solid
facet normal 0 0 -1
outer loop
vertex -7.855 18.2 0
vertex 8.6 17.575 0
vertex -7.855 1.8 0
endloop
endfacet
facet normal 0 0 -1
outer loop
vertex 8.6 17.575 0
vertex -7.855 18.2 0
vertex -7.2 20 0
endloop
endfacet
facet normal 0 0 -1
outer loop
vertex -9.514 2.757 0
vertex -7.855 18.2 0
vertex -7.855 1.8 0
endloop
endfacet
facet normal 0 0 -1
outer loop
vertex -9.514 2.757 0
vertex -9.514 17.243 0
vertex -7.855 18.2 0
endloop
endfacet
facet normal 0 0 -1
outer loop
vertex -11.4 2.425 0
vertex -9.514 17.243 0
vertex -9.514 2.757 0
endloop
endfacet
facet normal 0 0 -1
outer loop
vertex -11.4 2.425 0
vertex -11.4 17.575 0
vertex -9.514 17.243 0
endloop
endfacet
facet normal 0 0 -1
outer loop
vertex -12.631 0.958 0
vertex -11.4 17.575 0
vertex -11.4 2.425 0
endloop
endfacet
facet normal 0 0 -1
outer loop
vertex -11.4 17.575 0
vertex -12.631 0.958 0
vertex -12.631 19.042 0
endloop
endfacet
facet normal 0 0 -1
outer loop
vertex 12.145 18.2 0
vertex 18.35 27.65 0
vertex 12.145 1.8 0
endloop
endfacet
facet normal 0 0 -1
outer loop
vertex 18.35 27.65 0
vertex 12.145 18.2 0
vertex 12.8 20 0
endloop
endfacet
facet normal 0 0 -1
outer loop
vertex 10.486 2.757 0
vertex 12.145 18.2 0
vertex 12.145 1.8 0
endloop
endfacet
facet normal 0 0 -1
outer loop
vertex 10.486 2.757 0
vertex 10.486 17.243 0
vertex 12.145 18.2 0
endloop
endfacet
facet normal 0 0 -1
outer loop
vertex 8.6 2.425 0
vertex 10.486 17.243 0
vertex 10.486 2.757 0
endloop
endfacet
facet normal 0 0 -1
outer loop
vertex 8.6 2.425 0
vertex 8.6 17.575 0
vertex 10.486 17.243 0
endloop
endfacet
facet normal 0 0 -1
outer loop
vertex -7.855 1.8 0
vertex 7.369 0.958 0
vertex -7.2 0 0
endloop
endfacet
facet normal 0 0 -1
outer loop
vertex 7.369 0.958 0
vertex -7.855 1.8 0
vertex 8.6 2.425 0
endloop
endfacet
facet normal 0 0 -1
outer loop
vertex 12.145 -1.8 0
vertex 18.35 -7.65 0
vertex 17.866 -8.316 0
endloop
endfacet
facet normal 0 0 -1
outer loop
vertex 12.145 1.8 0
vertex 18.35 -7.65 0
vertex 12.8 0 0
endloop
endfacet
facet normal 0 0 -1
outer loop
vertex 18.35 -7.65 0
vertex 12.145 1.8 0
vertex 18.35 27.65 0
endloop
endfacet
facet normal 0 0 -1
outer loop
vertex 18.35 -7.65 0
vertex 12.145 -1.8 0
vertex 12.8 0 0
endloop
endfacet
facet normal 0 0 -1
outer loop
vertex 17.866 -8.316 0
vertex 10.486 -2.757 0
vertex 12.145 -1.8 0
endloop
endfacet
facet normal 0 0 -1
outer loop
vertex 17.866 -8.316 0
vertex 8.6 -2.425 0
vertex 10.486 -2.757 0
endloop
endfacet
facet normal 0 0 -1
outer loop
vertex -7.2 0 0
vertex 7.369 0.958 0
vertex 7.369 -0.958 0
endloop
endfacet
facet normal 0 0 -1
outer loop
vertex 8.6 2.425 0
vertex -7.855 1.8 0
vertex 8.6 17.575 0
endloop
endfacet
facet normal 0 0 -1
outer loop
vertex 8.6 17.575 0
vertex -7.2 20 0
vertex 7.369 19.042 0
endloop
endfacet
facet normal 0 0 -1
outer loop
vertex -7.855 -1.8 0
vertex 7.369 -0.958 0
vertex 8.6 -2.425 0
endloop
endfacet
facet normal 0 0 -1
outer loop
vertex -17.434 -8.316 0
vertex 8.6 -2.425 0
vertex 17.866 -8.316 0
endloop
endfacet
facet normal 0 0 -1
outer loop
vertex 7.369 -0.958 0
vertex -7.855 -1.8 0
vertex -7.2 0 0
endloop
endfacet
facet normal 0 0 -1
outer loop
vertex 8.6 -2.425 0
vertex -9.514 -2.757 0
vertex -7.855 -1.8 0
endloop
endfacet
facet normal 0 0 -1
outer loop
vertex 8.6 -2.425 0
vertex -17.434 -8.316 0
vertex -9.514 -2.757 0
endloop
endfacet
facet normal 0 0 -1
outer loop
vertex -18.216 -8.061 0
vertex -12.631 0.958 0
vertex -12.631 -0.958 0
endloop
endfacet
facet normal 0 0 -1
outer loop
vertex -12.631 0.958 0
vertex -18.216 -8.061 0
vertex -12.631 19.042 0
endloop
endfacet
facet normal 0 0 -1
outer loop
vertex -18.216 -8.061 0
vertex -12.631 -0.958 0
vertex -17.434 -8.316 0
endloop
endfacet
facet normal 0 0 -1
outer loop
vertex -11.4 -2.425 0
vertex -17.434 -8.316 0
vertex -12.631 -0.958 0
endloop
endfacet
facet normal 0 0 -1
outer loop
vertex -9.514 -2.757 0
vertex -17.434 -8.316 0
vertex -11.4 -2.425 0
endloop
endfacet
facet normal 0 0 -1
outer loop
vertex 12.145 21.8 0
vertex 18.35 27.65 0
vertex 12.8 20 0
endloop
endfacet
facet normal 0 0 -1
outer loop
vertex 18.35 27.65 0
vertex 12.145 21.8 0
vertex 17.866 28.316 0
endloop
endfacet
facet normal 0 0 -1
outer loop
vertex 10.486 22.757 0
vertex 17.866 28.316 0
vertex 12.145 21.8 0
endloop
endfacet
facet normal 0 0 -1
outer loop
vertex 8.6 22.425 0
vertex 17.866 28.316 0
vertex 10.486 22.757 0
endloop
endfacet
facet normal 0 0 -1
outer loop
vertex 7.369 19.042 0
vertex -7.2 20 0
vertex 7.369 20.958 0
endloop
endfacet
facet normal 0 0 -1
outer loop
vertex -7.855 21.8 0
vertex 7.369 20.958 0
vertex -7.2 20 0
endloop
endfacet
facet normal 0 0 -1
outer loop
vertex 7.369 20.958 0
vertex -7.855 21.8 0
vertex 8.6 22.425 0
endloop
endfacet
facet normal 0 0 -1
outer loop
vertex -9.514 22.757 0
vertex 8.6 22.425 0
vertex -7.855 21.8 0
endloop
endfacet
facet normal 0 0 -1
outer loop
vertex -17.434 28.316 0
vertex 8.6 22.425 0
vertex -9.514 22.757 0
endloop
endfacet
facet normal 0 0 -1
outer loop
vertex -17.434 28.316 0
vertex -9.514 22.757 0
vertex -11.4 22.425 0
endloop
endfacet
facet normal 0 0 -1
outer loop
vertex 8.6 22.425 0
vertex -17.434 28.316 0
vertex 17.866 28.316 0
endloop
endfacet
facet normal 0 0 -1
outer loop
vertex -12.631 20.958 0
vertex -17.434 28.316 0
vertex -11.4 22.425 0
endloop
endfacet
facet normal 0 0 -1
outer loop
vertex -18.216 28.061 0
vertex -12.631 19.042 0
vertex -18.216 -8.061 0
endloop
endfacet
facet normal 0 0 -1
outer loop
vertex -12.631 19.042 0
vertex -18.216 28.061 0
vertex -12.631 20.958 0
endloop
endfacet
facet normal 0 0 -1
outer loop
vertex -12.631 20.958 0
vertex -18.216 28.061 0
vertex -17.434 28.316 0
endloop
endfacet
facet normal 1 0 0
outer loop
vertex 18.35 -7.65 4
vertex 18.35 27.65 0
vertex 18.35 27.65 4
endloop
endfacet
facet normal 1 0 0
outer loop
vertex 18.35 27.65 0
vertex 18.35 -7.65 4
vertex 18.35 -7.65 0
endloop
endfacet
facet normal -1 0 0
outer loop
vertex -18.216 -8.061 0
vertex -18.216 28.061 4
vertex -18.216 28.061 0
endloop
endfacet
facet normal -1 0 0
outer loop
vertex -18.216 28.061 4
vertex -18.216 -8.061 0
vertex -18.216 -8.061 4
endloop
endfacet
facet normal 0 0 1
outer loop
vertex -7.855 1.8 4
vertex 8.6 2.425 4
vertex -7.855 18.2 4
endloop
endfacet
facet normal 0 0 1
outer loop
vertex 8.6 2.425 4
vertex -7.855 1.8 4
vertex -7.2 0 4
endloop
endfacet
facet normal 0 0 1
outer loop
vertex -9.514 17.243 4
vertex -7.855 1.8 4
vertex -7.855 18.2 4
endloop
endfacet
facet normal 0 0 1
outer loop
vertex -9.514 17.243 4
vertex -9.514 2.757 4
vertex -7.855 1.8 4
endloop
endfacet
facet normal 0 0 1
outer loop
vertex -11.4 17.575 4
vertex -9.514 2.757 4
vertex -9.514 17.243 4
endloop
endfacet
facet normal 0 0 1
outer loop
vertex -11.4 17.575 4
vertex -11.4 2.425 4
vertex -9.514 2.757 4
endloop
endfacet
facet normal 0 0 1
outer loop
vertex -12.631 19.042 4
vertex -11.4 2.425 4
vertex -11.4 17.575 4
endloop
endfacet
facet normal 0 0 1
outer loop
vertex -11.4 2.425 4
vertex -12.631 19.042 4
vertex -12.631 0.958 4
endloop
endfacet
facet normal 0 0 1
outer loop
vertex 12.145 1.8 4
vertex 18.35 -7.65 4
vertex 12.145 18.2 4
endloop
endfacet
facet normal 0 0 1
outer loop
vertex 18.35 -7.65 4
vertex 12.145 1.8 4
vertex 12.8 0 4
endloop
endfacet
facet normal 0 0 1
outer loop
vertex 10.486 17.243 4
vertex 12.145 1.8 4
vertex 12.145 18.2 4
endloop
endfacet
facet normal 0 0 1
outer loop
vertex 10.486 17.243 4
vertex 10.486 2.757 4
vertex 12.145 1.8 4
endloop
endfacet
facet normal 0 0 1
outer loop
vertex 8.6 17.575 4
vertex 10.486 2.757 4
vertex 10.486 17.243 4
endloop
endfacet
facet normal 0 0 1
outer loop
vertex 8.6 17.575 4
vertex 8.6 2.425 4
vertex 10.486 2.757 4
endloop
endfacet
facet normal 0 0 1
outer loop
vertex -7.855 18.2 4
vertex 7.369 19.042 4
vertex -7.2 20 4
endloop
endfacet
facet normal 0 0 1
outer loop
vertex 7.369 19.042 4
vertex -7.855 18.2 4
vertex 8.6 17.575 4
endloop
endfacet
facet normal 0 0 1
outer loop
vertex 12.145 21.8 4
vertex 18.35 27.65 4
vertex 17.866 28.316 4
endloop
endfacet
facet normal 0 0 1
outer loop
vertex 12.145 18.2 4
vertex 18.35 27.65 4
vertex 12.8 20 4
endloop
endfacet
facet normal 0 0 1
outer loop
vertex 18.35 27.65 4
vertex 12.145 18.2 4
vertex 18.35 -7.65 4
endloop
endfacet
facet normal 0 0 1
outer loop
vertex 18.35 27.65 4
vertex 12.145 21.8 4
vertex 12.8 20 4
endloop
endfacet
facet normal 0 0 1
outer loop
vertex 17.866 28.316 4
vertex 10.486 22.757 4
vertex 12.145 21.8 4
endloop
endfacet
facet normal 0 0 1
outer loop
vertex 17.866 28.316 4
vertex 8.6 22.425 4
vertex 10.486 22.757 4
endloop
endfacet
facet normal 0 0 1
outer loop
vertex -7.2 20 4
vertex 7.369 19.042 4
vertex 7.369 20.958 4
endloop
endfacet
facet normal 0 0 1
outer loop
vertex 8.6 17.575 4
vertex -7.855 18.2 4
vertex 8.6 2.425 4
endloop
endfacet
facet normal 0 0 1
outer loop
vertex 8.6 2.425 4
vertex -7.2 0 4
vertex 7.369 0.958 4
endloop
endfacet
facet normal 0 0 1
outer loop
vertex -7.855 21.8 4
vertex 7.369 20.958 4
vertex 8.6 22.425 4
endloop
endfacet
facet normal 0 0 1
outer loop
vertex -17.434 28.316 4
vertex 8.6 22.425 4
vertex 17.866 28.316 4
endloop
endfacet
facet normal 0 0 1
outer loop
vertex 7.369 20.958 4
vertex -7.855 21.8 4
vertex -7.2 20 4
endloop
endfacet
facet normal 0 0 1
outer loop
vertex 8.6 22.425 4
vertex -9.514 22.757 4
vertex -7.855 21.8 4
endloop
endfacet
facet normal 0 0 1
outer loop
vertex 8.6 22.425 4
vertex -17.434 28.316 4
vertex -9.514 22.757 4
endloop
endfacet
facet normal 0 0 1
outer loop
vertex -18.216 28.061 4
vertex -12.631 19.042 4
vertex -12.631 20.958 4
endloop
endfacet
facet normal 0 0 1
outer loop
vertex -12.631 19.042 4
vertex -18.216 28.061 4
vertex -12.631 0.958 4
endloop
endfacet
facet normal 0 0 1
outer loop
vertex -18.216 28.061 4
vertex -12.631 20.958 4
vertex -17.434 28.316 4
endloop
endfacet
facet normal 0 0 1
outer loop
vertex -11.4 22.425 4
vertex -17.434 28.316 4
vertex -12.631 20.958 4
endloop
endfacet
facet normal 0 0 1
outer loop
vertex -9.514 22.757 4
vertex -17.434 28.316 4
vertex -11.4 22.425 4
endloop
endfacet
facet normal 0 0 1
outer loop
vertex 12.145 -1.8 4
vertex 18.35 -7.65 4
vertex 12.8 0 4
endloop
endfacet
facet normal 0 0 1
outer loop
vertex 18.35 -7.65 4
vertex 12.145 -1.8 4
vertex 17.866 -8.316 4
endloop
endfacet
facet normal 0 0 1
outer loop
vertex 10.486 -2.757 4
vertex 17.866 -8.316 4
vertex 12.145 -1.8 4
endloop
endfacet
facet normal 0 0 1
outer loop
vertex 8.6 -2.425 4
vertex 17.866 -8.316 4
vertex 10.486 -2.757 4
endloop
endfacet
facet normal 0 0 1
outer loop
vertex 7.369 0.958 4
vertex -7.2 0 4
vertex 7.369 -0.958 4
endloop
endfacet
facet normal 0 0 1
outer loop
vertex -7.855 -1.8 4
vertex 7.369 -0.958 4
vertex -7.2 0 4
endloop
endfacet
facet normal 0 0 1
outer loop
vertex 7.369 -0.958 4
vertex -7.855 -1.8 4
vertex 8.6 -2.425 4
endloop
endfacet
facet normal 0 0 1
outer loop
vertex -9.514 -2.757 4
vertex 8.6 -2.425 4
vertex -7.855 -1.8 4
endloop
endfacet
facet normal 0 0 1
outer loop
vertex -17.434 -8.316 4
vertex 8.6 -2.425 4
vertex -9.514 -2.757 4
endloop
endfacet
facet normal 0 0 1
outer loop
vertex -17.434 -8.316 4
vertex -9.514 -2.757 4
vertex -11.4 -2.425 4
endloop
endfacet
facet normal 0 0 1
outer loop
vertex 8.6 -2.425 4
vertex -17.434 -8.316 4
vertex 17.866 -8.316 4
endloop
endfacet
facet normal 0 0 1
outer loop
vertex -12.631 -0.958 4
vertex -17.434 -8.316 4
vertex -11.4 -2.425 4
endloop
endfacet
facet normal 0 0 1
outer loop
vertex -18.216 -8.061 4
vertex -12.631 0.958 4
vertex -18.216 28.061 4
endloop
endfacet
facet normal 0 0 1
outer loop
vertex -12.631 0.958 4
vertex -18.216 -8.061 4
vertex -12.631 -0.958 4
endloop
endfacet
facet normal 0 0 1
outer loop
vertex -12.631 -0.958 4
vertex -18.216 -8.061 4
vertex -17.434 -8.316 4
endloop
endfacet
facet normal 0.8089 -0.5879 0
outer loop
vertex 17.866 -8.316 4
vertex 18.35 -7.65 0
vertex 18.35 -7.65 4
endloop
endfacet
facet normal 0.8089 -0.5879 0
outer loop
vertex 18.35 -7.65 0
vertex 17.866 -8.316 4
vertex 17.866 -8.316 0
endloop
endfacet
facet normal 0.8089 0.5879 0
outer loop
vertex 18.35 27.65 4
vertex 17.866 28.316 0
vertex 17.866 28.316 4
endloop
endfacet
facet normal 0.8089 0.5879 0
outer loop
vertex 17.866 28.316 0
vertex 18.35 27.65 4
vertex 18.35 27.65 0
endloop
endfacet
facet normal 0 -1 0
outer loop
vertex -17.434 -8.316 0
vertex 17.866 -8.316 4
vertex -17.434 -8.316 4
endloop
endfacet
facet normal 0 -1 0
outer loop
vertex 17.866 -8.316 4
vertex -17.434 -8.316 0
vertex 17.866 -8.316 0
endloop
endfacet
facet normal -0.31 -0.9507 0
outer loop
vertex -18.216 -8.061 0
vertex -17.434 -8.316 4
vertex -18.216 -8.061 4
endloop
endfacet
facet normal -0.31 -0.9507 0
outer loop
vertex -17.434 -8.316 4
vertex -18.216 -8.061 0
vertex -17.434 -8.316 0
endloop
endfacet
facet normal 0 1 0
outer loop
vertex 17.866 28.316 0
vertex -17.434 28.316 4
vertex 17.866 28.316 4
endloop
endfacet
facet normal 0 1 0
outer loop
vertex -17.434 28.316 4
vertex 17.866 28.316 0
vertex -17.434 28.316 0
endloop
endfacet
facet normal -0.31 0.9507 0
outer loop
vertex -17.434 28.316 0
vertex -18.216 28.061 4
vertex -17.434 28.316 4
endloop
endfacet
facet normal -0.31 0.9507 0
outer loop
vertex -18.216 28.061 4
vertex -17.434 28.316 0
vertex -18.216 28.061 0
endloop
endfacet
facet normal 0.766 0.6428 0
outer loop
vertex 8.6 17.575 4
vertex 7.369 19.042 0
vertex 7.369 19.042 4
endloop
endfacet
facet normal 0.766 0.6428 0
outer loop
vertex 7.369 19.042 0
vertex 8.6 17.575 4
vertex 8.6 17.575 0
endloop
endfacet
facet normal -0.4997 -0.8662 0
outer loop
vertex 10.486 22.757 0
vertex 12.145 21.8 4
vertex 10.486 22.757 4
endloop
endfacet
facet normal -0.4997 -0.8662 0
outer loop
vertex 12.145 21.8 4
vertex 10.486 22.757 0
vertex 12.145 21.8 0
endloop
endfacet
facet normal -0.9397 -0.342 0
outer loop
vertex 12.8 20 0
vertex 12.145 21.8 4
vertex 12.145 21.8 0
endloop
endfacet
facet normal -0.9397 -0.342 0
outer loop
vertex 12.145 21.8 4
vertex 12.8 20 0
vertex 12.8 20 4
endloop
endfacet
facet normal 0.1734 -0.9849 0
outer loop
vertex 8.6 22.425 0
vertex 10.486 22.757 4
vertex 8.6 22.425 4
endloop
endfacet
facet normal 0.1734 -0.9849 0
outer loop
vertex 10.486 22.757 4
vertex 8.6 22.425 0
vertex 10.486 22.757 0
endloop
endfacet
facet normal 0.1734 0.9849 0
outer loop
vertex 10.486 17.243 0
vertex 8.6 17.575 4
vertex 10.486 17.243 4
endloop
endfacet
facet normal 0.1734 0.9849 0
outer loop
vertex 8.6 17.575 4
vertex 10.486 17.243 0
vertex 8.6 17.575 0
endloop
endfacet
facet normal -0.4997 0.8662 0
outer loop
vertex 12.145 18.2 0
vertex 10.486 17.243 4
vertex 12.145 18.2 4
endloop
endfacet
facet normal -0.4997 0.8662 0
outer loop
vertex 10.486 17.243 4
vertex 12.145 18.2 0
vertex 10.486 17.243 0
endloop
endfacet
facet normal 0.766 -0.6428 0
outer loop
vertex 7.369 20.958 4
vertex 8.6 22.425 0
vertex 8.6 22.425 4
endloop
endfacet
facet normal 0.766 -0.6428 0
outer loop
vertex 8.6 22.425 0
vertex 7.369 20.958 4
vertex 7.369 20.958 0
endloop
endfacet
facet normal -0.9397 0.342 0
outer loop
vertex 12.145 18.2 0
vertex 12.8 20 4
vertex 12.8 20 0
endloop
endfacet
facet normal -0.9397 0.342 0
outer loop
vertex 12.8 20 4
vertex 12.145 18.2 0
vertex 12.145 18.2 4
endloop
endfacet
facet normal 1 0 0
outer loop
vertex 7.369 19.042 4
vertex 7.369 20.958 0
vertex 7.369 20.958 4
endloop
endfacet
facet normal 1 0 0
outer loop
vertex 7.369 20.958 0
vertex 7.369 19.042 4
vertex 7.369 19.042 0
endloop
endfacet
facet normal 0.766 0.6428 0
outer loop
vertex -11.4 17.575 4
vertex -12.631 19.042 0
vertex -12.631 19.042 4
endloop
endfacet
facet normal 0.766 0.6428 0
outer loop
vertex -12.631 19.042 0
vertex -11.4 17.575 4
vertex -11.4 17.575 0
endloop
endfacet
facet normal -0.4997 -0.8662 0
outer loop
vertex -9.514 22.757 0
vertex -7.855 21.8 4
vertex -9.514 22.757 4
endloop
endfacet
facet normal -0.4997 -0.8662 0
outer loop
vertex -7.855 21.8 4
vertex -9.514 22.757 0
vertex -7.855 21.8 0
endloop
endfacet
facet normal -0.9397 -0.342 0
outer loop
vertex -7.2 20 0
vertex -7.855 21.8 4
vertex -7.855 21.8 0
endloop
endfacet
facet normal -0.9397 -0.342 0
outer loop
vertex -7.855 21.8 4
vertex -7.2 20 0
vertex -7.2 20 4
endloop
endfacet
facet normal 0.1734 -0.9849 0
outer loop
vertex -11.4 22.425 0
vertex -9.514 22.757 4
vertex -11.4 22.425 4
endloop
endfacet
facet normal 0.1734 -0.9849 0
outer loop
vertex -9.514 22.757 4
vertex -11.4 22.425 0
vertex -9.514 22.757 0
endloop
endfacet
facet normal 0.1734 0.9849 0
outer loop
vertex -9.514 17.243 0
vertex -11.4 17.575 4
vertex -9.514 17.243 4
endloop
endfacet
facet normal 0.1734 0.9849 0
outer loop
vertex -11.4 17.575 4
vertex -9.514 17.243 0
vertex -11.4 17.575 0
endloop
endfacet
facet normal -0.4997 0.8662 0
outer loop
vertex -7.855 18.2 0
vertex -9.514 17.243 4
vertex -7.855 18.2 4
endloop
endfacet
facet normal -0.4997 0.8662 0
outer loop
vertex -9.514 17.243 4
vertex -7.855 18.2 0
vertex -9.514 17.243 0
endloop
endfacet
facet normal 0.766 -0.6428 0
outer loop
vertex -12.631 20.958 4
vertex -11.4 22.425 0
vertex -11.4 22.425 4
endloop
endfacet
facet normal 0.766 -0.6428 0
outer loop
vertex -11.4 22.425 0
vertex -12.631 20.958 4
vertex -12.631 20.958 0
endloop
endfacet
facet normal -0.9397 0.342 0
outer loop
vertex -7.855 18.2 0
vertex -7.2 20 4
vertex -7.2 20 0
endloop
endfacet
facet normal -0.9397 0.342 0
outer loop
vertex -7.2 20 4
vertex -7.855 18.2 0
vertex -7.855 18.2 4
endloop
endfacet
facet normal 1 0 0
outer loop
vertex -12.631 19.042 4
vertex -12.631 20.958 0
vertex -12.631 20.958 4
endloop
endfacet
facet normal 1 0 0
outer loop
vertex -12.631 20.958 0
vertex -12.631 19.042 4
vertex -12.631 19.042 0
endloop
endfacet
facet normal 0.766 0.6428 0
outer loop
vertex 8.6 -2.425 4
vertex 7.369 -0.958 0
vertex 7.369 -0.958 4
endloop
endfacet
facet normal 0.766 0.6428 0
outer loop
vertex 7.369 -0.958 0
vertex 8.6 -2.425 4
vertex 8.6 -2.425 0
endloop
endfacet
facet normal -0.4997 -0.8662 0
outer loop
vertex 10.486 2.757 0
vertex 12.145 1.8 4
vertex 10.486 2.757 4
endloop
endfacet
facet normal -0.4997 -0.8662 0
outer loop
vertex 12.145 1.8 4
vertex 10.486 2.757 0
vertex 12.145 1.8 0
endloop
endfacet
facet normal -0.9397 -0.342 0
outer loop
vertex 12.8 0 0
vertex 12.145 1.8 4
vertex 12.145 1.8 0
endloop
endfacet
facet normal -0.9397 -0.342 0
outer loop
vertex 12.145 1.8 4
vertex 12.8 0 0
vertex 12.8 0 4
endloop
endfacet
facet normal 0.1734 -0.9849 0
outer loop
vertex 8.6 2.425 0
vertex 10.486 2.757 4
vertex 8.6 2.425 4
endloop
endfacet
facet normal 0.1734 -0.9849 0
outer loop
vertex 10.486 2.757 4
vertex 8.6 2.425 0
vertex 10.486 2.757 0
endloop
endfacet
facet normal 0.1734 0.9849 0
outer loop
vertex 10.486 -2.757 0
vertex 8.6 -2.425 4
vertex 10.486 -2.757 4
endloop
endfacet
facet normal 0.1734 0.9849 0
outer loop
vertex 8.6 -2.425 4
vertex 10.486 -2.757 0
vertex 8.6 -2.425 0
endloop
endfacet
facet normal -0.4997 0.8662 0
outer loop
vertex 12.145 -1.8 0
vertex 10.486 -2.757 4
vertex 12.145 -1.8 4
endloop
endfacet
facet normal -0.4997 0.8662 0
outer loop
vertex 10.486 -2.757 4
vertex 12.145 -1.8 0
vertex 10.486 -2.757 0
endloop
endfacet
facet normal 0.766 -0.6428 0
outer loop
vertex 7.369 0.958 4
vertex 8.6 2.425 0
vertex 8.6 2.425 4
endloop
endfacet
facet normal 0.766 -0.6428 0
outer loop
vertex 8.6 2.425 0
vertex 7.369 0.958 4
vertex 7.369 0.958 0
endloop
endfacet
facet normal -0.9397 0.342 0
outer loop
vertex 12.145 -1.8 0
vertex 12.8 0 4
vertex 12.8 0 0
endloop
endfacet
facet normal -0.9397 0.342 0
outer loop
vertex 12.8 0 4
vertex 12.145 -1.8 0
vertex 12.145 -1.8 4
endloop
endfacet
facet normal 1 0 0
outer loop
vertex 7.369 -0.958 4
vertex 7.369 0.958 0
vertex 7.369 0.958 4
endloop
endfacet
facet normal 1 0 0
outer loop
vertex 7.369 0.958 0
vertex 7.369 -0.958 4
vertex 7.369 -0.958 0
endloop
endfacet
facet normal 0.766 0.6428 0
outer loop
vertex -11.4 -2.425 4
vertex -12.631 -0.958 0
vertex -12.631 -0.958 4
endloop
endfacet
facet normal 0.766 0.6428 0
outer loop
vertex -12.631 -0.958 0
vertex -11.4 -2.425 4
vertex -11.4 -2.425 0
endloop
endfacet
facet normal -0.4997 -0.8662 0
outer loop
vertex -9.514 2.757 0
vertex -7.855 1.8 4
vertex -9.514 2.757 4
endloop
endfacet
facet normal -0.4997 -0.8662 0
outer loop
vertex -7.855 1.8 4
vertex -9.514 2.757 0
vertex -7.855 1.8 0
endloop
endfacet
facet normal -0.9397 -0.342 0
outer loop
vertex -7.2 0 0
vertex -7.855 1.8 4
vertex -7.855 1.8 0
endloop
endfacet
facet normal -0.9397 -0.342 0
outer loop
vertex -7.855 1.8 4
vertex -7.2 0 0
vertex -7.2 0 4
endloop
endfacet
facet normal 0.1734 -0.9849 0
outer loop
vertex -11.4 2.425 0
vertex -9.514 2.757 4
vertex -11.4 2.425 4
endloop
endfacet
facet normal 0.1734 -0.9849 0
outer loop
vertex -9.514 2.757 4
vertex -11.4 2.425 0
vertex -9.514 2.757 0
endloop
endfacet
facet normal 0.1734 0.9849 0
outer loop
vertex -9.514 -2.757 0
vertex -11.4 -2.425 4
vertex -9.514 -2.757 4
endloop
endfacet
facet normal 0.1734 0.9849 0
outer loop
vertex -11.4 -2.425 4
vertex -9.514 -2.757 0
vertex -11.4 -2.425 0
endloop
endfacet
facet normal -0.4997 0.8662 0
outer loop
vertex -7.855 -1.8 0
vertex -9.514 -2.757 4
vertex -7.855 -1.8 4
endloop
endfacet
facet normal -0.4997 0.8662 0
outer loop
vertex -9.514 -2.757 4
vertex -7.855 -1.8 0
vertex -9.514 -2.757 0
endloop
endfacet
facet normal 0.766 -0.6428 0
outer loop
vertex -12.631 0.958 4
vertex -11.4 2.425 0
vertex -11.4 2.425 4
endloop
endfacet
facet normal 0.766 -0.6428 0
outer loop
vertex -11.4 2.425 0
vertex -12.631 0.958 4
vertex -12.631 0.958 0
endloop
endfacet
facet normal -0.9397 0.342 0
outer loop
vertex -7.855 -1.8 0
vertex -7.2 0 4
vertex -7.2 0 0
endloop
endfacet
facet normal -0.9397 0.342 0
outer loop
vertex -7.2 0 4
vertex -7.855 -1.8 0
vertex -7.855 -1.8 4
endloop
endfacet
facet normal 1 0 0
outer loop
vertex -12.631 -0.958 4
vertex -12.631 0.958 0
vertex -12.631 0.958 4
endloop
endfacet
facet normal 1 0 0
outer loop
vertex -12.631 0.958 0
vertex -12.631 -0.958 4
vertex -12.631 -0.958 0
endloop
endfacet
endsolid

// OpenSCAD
// rob@openpart.co.uk 20140201-23:55
// 4 hole joining plate for 40mm NOMINAL extrusion
// MakerSlide, V-Slot 4020 & others

module roundedRect(size, radius)
{
	x = size[0];
	y = size[1];
	z = size[2];

	linear_extrude(height=z)
	hull()
	{
		// place 4 circles in the corners, with the given radius
		translate([(-x/2)+(radius/2), (-y/2)+(radius/2), 0])
		circle(r=radius);

		translate([(x/2)-(radius/2), (-y/2)+(radius/2), 0])
		circle(r=radius);

		translate([(-x/2)+(radius/2), (y/2)-(radius/2), 0])
		circle(r=radius);

		translate([(x/2)-(radius/2), (y/2)-(radius/2), 0])
		circle(r=radius);
	}
}

hole = 5.6 / 2;

plate_width = 36;
plate_length = 36;
plate_thickness = 4;
extend_past_thickness = 2;
corner_radius = 0.7;

difference() {
	translate([0, 10, 0])
		roundedRect ([plate_length, plate_width, plate_thickness], corner_radius);
	
	// Holes
	translate([10,20,-1])
		cylinder(h = (extend_past_thickness+plate_thickness+2), r = hole);
	translate([-10,20,-1])
		cylinder(h = (extend_past_thickness+plate_thickness+2), r = hole);
	translate([10,0,-1])
		cylinder(h = (extend_past_thickness+plate_thickness+2), r = hole);
	translate([-10,0,-1])
		cylinder(h = (extend_past_thickness+plate_thickness+2), r = hole);

}
